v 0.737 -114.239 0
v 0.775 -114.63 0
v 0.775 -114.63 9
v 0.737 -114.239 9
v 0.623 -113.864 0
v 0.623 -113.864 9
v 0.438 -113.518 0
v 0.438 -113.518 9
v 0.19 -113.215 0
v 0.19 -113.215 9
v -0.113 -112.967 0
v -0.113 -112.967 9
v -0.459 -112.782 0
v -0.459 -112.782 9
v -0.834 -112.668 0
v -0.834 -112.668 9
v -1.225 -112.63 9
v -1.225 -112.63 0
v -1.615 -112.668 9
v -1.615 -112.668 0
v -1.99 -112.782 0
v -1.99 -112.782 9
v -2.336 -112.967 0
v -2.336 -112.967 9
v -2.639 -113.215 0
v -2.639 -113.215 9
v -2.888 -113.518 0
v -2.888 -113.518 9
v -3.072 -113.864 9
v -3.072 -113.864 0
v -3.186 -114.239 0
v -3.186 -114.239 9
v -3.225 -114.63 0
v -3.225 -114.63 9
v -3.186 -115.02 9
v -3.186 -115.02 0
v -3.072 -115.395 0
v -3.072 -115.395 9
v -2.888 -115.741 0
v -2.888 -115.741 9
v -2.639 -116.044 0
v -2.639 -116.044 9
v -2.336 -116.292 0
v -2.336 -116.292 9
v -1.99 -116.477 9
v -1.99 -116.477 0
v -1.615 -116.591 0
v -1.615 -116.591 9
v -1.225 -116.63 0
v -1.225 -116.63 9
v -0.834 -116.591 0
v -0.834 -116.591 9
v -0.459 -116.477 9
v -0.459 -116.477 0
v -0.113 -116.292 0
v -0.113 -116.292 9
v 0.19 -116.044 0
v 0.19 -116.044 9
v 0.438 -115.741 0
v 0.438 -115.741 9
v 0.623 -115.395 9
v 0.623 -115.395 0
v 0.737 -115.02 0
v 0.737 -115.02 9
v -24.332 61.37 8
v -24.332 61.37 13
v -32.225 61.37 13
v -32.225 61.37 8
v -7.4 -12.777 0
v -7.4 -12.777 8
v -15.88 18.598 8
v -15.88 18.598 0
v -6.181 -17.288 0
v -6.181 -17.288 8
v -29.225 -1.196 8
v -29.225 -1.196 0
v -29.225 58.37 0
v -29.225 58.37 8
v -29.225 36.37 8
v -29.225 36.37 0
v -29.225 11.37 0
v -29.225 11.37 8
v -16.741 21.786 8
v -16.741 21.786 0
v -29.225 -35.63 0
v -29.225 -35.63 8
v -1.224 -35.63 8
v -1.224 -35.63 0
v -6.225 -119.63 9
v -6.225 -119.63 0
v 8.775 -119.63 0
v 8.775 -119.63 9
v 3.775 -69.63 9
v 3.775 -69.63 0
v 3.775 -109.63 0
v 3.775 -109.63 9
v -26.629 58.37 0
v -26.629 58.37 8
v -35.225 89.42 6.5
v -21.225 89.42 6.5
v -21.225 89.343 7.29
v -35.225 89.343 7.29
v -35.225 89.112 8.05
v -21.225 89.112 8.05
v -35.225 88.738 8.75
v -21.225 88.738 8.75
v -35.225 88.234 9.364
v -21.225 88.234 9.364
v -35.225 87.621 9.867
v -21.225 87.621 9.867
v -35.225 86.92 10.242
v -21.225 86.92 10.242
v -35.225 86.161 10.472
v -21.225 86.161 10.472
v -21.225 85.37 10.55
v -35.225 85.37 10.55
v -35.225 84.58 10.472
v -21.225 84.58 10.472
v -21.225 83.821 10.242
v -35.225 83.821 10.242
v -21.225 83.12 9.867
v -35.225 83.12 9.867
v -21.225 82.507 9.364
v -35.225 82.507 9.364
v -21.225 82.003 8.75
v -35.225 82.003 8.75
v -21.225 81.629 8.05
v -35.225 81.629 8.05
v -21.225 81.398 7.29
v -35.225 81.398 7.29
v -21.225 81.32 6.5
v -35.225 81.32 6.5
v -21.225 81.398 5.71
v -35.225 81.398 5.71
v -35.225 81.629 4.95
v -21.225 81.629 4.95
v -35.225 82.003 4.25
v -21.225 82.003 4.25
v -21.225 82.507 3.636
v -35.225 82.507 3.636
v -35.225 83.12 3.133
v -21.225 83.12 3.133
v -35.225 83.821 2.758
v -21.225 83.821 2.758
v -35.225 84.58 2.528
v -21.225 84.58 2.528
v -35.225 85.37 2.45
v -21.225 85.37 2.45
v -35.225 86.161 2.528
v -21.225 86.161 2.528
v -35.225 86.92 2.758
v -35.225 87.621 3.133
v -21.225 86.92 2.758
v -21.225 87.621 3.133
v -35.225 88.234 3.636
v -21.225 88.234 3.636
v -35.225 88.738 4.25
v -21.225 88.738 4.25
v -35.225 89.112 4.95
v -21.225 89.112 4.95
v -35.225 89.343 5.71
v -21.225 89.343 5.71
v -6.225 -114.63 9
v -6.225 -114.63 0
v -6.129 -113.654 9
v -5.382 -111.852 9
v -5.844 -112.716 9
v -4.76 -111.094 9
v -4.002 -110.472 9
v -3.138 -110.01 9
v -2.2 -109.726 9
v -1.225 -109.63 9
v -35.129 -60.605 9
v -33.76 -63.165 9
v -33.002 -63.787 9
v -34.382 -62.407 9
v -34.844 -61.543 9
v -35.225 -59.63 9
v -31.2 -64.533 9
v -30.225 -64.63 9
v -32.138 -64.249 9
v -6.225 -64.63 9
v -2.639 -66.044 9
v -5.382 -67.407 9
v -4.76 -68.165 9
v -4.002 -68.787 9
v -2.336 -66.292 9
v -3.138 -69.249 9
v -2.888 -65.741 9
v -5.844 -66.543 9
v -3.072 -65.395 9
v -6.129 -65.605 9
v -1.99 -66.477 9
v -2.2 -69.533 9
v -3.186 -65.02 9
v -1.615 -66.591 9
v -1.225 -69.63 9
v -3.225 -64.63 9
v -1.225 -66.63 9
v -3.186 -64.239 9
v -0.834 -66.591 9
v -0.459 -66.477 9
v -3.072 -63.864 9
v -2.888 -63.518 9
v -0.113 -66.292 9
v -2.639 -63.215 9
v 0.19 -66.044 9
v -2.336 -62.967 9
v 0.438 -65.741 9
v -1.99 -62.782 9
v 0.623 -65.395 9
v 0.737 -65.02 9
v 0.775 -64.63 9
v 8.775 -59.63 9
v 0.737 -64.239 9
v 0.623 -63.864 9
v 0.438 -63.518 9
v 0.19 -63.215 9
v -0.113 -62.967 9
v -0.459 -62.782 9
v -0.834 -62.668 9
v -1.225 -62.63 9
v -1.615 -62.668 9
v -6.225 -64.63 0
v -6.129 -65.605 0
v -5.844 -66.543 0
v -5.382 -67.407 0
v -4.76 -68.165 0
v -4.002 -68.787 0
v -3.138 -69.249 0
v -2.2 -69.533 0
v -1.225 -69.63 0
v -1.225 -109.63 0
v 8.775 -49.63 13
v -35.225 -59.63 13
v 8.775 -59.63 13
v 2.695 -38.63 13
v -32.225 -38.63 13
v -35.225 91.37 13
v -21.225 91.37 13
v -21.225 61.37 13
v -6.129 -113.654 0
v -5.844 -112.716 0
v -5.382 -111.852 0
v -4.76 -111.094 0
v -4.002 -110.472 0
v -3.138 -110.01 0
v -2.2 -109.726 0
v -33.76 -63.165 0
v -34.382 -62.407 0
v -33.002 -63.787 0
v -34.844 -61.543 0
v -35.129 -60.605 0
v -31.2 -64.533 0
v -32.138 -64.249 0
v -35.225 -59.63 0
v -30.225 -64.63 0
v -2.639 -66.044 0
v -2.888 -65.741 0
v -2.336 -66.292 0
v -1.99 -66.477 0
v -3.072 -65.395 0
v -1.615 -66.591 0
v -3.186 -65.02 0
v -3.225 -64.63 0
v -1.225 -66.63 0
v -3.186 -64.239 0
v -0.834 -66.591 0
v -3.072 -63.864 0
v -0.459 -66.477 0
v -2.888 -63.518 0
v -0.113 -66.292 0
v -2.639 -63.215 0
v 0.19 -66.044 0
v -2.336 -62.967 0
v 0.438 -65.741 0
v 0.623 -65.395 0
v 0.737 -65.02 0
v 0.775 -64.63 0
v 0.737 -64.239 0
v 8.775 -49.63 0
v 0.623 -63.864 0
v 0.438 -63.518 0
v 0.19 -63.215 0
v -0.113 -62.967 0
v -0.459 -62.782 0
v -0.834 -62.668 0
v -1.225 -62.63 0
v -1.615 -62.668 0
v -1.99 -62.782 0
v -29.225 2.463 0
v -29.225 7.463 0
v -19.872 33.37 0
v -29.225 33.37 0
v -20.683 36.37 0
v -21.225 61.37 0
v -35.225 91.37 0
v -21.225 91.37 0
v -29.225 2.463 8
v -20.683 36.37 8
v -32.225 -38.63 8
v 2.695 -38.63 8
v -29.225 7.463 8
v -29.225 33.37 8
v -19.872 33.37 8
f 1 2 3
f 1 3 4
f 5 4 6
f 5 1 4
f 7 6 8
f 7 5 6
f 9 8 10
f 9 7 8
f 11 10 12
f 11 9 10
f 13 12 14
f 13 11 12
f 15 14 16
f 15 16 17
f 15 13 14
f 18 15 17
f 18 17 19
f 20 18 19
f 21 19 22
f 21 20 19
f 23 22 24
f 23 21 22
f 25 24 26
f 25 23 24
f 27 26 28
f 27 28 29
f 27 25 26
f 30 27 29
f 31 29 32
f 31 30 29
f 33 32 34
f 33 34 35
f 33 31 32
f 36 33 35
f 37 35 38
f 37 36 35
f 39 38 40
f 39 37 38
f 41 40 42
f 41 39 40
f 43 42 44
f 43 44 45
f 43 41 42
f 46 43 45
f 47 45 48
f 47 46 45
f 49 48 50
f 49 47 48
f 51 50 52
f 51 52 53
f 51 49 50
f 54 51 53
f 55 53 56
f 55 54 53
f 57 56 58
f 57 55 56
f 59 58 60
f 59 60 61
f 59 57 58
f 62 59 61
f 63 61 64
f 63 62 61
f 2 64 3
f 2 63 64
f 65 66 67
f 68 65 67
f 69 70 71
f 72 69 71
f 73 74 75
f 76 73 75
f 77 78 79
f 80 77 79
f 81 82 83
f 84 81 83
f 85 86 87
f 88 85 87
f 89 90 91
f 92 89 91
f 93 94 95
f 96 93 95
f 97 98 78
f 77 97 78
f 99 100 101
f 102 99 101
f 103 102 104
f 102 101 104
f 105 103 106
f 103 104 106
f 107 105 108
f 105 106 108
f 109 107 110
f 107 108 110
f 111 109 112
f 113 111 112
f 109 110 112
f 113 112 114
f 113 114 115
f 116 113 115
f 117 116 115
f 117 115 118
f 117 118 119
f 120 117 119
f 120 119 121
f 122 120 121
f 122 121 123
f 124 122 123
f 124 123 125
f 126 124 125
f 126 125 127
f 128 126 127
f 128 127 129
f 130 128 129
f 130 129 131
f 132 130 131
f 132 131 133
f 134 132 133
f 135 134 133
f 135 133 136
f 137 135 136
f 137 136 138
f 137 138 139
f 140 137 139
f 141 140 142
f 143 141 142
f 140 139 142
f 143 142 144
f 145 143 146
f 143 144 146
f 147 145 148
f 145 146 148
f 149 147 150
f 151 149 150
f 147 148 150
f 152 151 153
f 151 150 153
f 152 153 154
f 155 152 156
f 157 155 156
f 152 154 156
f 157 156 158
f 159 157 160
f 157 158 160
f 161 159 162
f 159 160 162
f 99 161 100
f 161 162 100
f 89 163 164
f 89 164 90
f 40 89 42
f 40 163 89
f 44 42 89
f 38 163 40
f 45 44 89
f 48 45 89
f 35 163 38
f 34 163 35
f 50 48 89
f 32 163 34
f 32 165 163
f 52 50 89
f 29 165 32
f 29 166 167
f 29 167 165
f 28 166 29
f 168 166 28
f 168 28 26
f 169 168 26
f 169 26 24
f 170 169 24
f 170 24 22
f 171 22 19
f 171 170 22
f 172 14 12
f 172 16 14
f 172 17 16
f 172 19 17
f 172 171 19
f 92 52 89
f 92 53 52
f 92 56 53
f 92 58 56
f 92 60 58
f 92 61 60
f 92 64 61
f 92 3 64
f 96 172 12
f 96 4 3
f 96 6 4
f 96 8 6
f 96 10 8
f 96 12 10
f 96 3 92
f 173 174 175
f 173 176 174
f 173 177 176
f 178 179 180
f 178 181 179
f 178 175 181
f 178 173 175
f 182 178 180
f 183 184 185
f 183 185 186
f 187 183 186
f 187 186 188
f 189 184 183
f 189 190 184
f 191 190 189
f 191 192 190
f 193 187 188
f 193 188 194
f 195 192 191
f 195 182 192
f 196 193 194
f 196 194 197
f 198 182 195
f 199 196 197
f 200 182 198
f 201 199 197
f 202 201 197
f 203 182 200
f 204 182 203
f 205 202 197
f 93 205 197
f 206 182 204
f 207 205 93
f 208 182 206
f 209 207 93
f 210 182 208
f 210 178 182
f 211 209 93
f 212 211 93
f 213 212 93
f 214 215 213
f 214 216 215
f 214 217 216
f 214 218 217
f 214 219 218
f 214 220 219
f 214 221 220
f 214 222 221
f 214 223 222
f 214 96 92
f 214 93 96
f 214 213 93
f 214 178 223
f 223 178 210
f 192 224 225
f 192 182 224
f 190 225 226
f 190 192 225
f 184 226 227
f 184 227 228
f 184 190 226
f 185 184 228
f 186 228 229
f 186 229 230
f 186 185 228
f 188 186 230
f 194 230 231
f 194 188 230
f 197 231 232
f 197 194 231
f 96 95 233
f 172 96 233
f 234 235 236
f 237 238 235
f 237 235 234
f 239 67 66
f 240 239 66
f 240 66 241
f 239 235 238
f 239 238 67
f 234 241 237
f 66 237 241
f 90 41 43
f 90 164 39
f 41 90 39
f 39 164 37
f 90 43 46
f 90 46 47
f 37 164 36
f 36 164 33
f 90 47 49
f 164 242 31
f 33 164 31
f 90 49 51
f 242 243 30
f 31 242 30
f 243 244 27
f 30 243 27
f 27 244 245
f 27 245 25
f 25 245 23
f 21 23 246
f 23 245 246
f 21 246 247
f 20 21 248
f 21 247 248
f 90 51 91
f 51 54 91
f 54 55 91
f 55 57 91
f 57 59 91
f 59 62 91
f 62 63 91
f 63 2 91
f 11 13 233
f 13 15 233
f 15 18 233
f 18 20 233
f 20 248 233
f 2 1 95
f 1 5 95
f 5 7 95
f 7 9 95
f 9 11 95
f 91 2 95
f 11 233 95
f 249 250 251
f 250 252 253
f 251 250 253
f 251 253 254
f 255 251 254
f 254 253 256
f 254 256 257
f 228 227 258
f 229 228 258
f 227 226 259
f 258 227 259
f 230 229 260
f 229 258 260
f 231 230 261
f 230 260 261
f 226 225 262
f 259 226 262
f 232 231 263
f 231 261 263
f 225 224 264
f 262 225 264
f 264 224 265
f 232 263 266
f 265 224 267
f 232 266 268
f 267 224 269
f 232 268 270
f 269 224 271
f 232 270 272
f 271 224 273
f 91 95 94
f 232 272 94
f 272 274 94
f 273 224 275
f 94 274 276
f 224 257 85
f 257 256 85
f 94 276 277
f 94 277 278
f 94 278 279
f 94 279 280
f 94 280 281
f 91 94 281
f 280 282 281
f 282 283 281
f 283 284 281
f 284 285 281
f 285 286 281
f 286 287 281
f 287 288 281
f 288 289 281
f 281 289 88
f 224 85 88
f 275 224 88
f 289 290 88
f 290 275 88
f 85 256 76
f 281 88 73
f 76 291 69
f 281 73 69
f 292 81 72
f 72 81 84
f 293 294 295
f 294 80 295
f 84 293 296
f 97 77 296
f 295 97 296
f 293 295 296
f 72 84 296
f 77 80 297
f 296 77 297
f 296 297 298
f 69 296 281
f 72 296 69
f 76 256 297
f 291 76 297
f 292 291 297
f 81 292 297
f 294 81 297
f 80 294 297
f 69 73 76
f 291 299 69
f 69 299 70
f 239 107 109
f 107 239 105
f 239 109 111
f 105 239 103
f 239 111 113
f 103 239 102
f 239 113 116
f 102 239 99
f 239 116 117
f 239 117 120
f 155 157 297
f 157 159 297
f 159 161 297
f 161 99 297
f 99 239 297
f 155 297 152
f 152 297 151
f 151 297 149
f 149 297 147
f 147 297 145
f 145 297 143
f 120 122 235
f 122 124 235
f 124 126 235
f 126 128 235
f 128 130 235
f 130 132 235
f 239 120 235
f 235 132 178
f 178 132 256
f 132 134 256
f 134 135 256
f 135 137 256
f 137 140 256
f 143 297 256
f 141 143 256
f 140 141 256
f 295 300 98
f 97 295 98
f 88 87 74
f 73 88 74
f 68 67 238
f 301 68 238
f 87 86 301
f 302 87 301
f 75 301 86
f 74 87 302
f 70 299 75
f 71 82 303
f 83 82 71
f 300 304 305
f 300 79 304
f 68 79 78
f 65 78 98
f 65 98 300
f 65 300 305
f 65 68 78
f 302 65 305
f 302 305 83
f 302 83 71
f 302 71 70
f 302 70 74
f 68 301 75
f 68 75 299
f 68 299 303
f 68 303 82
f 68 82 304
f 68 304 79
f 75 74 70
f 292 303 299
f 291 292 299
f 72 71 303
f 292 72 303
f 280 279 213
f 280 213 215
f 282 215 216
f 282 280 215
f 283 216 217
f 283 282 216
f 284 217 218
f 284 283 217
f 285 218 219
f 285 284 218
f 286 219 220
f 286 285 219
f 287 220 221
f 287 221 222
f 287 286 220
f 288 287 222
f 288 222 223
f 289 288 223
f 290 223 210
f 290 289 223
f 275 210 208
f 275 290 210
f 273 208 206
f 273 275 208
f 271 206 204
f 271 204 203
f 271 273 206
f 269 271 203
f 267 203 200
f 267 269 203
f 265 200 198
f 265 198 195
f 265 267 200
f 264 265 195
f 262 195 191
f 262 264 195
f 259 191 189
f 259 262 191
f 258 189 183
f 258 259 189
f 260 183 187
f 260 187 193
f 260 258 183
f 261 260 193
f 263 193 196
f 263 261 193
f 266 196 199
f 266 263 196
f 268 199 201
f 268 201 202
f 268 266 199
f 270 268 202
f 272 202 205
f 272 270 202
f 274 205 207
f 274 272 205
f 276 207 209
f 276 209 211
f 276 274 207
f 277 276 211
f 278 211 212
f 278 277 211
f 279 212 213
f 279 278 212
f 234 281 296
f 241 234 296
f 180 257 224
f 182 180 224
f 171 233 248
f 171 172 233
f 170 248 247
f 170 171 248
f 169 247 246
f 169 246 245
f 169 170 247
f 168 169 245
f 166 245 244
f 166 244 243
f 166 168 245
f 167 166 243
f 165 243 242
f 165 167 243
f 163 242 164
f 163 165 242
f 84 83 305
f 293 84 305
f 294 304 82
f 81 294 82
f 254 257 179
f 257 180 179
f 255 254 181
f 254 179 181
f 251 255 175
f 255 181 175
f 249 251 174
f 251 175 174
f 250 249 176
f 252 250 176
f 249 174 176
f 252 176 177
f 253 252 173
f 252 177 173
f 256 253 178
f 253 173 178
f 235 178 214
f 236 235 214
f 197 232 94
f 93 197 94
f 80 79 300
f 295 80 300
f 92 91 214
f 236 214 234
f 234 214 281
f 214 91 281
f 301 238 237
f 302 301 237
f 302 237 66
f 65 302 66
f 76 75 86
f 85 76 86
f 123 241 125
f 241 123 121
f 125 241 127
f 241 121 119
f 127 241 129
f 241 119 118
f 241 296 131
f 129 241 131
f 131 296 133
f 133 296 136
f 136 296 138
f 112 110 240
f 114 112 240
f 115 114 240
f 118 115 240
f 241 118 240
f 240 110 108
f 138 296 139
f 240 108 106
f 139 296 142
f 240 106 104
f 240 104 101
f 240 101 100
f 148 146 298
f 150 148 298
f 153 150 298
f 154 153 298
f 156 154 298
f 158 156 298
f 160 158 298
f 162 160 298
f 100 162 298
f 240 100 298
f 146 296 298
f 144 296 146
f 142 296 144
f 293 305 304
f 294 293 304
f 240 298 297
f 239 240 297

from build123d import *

# Parameters (mm, degrees)
F0_R      = 2
F1_DEPTH  = 9
F2_DEPTH  = 13
F4_DEPTH  = 5
F6_DEPTH  = 8.001
F7_R      = 4.99999
F8_R      = 5
F9_R      = 5
F10_R     = 4.05
F11_DEPTH = 14.001


# Not quite as in the source:
# - a fillet or chamfer is up to 0.001 mm smaller than in the source, because OpenCascade refuses the exact size


with BuildPart() as f1:
    # F0 (on Top) → F1 (new body)
    with BuildSketch(Plane.XY):
        Polygon((8.7753673922, -59.6295086741), (-35.2246326078, -59.6295086741), (-35.2246326078, -64.6295086741), (-6.2246326078, -64.6295086741), (-6.2246326078, -69.6295086741), (3.7753673922, -69.6295086741), (3.7753673922, -109.6295086741), (-6.2246326078, -109.6295086741), (-6.2246326078, -119.6295086741), (8.7753673922, -119.6295086741), align=None)
        with Locations((-1.2246326078, -114.6295086741)):
            Circle(F0_R, mode=Mode.SUBTRACT)
        with Locations((-1.2246326078, -64.6295086741)):
            Circle(F0_R, mode=Mode.SUBTRACT)
    extrude(amount=F1_DEPTH)

    # F0 (on Top) → F2 (join)
    with BuildSketch(Plane.XY):
        Polygon((-21.2246326078, 61.3704913259), (-21.2246326078, 91.3704913259), (-35.2246326078, 91.3704913259), (-35.2246326078, -59.6295086741), (8.7753673922, -59.6295086741), (8.7753673922, -49.6295086741), align=None)
    extrude(amount=F2_DEPTH)

    # F3 (on face) → F4 (cut)
    with BuildSketch(Plane.XY.offset(13)):
        Polygon((2.6947563819, -38.6295086741), (-24.3322706451, 61.3704913259), (-32.2246326078, 61.3704913259), (-32.2246326078, -38.6295086741), align=None)
    extrude(amount=-F4_DEPTH, mode=Mode.SUBTRACT)

    # F5 (on face) → F6 (cut, through all)
    with BuildSketch(Plane.XY.offset(8)):
        Polygon((-26.6290978716, 58.3704913259), (-29.2246326078, 58.3704913259), (-29.2246326078, 36.3704913259), (-20.6831519256, 36.3704913259), align=None)
        Polygon((-19.8723411148, 33.3704913259), (-29.2246326078, 33.3704913259), (-29.2246326078, 11.3704913259), (-16.7414328131, 21.7861306095), align=None)
        Polygon((-15.879765316, 18.5979608701), (-29.2246326078, 7.463369877), (-29.2246326078, 2.463369877), (-7.3999758243, -12.777260249), align=None)
        Polygon((-6.1809639439, -17.2876042066), (-29.2246326078, -1.1957117047), (-29.2246326078, -35.6295086741), (-1.2236924662, -35.6295086741), align=None)
    extrude(amount=-F6_DEPTH, mode=Mode.SUBTRACT)

    # F7 (radius 5 in the source; OpenCascade refuses exactly that, so slightly less here)
    f7_edges = [f1.edges().sort_by_distance(p)[0] for p in [
        (-6.224633, -69.629509, 4.5),
    ]]
    fillet(f7_edges, radius=F7_R)

    # F8
    f8_edges = [f1.edges().sort_by_distance(p)[0] for p in [
        (-6.224633, -109.629509, 4.5),
    ]]
    fillet(f8_edges, radius=F8_R)

    # F9
    f9_edges = [f1.edges().sort_by_distance(p)[0] for p in [
        (-35.224633, -64.629509, 4.5),
    ]]
    fillet(f9_edges, radius=F9_R)

    # F10 (on face) → F11 (cut, through all)
    with BuildSketch(Plane.YZ.offset(-21.2246326078)):
        with Locations((85.3704913259, 6.5)):
            Circle(F10_R)
    extrude(amount=-F11_DEPTH, mode=Mode.SUBTRACT)


solid = f1.part
